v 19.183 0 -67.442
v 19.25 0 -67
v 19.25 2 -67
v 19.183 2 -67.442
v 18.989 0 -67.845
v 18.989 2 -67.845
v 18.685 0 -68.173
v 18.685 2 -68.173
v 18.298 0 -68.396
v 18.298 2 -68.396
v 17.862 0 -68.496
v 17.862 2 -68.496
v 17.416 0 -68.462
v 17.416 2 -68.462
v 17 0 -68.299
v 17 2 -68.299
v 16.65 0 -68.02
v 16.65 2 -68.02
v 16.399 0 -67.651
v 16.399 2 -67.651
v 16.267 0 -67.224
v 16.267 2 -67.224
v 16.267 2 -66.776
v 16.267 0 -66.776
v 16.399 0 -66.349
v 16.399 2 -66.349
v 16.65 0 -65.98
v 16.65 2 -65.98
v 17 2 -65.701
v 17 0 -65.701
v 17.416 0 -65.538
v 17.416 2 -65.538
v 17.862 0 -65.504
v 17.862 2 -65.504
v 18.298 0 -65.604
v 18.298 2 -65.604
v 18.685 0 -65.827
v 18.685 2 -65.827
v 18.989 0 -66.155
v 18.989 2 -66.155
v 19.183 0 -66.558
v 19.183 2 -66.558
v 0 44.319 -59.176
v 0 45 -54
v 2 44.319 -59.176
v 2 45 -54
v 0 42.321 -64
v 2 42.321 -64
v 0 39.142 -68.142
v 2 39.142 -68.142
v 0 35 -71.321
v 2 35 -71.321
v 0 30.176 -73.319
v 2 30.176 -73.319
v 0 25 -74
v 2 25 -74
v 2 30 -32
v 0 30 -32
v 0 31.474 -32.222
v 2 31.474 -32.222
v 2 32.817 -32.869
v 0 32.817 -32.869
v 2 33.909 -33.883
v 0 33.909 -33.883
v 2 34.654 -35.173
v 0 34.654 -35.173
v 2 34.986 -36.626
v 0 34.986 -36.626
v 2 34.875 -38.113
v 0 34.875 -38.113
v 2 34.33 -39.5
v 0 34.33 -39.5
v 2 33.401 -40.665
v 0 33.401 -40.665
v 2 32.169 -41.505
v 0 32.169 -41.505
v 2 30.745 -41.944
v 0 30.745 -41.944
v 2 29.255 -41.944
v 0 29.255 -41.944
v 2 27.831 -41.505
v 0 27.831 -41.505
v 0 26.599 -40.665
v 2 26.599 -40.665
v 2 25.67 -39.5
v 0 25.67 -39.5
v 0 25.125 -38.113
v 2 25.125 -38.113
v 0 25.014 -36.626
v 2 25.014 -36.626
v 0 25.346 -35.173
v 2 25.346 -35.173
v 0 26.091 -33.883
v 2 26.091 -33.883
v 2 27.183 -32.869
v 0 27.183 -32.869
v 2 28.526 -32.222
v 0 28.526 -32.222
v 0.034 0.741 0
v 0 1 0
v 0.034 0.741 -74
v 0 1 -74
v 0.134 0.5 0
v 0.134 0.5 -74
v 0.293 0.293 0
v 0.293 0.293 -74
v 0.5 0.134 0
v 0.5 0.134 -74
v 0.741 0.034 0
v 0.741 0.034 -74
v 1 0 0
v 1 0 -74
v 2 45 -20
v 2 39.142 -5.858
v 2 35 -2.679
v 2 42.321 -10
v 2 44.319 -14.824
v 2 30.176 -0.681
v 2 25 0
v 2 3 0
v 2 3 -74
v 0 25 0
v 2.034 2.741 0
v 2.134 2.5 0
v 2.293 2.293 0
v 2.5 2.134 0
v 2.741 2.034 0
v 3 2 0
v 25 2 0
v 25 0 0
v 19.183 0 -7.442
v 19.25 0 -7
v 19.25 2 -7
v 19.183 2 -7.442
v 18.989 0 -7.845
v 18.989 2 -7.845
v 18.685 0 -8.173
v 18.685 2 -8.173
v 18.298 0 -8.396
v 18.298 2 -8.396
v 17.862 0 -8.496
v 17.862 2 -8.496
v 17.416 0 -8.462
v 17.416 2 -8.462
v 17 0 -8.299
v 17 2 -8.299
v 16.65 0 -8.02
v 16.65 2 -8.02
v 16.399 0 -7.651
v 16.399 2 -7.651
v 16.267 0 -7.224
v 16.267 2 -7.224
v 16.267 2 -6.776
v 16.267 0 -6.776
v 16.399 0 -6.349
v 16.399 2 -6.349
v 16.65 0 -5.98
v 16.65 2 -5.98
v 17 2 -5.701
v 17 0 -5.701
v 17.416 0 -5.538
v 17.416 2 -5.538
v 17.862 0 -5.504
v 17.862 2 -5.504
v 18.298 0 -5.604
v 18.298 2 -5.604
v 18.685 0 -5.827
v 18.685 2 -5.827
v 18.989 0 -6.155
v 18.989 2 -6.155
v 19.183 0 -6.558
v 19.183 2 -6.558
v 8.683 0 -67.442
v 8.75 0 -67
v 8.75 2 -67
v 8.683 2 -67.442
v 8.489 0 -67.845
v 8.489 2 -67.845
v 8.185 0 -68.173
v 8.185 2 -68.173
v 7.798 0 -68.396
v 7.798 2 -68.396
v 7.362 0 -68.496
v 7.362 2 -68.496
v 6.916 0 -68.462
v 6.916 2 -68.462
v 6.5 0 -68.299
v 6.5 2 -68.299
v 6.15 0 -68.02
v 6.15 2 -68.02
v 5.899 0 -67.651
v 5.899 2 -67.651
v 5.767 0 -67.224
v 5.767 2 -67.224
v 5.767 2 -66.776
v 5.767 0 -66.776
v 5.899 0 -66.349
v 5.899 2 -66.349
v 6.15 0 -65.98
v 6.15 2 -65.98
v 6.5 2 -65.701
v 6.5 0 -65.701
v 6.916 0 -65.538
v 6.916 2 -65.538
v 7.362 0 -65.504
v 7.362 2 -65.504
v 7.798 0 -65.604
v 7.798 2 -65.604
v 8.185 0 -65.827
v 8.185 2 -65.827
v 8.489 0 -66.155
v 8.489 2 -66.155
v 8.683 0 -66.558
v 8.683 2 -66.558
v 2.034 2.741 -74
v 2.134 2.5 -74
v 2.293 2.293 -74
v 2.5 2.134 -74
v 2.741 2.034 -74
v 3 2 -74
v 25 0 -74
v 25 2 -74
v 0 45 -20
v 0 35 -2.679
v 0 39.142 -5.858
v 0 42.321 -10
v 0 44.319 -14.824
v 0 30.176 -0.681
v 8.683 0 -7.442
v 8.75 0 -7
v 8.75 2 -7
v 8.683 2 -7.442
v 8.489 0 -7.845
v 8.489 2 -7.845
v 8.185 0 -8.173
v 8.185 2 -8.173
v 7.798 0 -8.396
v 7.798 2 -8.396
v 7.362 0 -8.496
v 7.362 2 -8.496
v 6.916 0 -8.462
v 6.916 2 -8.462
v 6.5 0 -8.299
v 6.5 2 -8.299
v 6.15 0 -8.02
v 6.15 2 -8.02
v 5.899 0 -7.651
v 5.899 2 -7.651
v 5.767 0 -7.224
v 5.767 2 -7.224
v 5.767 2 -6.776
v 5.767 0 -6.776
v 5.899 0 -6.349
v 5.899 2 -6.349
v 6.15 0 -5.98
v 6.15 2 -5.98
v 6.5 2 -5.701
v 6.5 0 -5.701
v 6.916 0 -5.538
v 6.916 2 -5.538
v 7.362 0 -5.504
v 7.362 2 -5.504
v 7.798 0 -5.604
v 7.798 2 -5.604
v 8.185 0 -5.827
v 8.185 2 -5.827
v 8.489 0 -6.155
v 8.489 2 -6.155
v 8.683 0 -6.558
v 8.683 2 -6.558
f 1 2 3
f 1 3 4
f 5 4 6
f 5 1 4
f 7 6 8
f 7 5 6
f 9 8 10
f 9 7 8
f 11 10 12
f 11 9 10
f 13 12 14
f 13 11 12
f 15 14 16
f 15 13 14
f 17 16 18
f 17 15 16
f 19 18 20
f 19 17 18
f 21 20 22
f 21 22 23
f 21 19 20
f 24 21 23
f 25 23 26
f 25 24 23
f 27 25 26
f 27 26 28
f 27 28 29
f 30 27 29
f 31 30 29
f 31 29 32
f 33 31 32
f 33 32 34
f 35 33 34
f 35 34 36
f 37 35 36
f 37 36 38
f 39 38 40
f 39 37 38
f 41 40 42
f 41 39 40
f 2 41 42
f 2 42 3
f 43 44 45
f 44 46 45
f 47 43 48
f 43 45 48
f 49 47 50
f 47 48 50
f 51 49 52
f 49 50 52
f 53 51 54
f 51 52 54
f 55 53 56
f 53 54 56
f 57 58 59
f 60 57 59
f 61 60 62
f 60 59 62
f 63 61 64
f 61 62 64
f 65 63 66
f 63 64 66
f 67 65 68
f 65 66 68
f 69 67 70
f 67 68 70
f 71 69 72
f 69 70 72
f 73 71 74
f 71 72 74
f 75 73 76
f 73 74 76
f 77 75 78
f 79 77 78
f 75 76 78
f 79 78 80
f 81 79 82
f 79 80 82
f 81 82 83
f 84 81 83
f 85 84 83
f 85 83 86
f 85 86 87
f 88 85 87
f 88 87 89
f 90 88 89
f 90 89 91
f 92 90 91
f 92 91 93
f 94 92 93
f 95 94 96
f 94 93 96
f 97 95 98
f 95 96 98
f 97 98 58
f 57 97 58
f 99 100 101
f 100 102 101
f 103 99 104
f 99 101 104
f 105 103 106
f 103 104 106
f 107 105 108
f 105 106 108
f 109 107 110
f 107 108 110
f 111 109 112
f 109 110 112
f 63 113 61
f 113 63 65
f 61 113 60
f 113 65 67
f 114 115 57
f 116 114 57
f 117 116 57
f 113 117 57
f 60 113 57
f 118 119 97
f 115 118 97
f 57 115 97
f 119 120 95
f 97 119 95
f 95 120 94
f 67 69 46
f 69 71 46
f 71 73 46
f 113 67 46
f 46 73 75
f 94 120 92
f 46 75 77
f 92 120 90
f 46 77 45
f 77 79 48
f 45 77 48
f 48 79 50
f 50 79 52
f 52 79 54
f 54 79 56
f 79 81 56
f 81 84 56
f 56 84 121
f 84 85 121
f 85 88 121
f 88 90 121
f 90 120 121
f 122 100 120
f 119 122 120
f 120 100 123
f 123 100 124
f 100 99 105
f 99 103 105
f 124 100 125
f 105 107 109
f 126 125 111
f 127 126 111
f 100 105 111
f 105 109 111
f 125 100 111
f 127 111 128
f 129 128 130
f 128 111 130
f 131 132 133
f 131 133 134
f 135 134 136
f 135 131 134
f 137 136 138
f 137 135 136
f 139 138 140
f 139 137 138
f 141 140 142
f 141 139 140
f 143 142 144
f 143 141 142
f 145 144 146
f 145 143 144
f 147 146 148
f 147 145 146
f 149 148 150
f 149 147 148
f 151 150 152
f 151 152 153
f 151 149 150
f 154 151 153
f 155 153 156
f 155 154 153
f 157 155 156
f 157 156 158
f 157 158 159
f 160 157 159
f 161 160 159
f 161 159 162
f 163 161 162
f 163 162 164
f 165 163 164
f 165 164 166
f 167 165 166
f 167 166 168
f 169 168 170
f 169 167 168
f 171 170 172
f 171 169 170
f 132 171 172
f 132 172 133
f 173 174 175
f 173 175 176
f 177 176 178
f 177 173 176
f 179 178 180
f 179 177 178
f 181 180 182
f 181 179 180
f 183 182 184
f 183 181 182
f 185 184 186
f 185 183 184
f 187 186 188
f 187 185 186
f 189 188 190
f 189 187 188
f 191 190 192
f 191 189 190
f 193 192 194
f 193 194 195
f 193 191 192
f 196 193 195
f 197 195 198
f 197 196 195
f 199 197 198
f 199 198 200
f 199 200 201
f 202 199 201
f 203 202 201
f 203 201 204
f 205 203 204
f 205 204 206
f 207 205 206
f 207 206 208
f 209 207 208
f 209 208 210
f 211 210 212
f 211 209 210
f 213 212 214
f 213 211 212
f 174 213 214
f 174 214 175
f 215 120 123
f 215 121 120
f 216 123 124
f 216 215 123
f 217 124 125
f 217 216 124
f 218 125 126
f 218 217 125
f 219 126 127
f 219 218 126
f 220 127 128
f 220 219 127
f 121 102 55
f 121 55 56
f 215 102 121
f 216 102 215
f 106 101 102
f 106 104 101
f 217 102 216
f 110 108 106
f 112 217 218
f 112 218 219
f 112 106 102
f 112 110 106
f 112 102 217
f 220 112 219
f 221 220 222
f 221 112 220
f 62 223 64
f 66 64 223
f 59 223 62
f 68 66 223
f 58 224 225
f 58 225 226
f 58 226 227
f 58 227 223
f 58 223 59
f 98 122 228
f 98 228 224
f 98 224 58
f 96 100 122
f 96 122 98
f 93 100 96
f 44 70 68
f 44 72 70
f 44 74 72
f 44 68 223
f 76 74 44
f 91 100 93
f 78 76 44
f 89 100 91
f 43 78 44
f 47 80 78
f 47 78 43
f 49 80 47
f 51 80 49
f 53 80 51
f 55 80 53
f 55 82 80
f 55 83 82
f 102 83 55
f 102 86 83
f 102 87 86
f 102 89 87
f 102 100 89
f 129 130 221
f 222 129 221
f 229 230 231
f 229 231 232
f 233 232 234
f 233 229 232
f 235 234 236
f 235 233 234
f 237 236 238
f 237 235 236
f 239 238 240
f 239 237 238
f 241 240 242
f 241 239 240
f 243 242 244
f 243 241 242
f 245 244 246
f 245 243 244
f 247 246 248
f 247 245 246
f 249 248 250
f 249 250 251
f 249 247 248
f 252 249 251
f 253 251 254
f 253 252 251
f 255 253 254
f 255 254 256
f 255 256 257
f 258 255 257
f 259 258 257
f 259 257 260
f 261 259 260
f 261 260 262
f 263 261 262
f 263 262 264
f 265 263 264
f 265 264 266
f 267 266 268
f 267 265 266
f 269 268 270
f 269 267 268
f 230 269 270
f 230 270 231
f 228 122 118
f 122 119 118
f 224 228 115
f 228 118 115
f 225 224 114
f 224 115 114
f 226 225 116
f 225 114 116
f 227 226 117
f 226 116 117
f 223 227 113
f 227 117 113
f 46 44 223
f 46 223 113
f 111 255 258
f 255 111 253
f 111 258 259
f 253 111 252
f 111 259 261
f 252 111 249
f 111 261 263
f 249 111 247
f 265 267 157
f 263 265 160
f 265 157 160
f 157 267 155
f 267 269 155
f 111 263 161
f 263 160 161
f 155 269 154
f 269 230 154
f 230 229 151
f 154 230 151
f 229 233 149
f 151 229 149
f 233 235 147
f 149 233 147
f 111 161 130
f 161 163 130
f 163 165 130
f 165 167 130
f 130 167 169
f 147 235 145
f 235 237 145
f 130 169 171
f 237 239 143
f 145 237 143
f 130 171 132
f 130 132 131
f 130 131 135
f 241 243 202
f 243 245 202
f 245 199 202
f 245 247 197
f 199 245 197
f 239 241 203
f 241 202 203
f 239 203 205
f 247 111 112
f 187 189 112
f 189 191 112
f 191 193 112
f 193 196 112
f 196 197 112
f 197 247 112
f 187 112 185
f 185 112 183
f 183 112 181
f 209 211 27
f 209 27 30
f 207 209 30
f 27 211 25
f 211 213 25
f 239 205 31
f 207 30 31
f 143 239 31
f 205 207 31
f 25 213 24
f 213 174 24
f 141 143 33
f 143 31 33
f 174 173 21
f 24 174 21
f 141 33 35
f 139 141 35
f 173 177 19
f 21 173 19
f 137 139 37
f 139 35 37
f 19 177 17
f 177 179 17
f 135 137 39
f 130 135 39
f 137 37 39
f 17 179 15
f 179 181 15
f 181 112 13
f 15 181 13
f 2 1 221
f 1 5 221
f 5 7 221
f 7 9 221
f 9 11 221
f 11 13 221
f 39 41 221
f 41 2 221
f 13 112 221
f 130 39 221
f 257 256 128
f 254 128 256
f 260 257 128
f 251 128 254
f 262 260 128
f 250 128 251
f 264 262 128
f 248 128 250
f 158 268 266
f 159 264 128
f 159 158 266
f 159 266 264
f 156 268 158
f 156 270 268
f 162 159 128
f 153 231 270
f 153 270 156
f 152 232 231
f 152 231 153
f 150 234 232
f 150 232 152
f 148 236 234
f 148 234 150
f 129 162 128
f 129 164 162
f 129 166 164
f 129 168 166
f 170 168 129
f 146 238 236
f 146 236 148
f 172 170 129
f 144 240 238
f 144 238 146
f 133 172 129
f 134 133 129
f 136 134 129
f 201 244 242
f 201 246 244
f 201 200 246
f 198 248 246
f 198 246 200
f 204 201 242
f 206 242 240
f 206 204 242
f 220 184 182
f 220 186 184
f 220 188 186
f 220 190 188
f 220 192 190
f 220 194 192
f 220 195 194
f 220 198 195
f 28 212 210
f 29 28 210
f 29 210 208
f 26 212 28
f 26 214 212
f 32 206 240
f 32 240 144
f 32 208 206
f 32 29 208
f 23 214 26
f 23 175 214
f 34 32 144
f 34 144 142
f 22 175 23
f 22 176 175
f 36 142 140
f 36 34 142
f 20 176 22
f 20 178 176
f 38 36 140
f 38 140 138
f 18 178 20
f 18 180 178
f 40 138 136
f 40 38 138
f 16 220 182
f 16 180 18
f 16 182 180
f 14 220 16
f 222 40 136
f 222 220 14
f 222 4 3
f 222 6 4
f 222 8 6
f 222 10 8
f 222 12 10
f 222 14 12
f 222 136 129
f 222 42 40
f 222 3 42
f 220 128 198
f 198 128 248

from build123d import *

# Parameters (mm, degrees)
SKETCH1_W           = 23
SKETCH1_H           = 74
SKETCH1_R           = 1.5
BOSS_EXTRUDE1_DEPTH = 2
SKETCH1_3_W         = 2
SKETCH1_3_H         = 74
BOSS_EXTRUDE2_DEPTH = 45
FILLET1_R           = 1
FILLET2_R           = 20
SKETCH2_R           = 5
CUT_EXTRUDE1_DEPTH  = 2


with BuildPart() as part:
    # Sketch1 → Boss-Extrude1 (new body)
    with BuildSketch(Plane(origin=(0, 0, 0), x_dir=(1, 0, 0), z_dir=(0, 1, 0))):
        with Locations((13.5, 37)):
            Rectangle(SKETCH1_W, SKETCH1_H)
        with Locations((7.25, 7)):
            Circle(SKETCH1_R, mode=Mode.SUBTRACT)
        with Locations((17.75, 7)):
            Circle(SKETCH1_R, mode=Mode.SUBTRACT)
        with Locations((7.25, 67)):
            Circle(SKETCH1_R, mode=Mode.SUBTRACT)
        with Locations((17.75, 67)):
            Circle(SKETCH1_R, mode=Mode.SUBTRACT)
    extrude(amount=BOSS_EXTRUDE1_DEPTH)

    # Sketch1<3> → Boss-Extrude2 (add)
    with BuildSketch(Plane(origin=(0, 0, 0), x_dir=(1, 0, 0), z_dir=(0, 1, 0))):
        with Locations((1, 37)):
            Rectangle(SKETCH1_3_W, SKETCH1_3_H)
    extrude(amount=BOSS_EXTRUDE2_DEPTH)

    # Fillet1
    fillet1_edges = [part.edges().sort_by_distance(p)[0] for p in [
        (0, 0, -37),
        (2, 2, -37),
    ]]
    fillet(fillet1_edges, radius=FILLET1_R)

    # Fillet2
    fillet2_edges = [part.edges().sort_by_distance(p)[0] for p in [
        (1, 45, -74),
        (1, 45, 0),
    ]]
    fillet(fillet2_edges, radius=FILLET2_R)

    # Sketch2 → Cut-Extrude1 (cut)
    with BuildSketch(Plane.ZY):
        with Locations((-37, 30)):
            Circle(SKETCH2_R)
    extrude(amount=-CUT_EXTRUDE1_DEPTH, mode=Mode.SUBTRACT)


solid = part.part
